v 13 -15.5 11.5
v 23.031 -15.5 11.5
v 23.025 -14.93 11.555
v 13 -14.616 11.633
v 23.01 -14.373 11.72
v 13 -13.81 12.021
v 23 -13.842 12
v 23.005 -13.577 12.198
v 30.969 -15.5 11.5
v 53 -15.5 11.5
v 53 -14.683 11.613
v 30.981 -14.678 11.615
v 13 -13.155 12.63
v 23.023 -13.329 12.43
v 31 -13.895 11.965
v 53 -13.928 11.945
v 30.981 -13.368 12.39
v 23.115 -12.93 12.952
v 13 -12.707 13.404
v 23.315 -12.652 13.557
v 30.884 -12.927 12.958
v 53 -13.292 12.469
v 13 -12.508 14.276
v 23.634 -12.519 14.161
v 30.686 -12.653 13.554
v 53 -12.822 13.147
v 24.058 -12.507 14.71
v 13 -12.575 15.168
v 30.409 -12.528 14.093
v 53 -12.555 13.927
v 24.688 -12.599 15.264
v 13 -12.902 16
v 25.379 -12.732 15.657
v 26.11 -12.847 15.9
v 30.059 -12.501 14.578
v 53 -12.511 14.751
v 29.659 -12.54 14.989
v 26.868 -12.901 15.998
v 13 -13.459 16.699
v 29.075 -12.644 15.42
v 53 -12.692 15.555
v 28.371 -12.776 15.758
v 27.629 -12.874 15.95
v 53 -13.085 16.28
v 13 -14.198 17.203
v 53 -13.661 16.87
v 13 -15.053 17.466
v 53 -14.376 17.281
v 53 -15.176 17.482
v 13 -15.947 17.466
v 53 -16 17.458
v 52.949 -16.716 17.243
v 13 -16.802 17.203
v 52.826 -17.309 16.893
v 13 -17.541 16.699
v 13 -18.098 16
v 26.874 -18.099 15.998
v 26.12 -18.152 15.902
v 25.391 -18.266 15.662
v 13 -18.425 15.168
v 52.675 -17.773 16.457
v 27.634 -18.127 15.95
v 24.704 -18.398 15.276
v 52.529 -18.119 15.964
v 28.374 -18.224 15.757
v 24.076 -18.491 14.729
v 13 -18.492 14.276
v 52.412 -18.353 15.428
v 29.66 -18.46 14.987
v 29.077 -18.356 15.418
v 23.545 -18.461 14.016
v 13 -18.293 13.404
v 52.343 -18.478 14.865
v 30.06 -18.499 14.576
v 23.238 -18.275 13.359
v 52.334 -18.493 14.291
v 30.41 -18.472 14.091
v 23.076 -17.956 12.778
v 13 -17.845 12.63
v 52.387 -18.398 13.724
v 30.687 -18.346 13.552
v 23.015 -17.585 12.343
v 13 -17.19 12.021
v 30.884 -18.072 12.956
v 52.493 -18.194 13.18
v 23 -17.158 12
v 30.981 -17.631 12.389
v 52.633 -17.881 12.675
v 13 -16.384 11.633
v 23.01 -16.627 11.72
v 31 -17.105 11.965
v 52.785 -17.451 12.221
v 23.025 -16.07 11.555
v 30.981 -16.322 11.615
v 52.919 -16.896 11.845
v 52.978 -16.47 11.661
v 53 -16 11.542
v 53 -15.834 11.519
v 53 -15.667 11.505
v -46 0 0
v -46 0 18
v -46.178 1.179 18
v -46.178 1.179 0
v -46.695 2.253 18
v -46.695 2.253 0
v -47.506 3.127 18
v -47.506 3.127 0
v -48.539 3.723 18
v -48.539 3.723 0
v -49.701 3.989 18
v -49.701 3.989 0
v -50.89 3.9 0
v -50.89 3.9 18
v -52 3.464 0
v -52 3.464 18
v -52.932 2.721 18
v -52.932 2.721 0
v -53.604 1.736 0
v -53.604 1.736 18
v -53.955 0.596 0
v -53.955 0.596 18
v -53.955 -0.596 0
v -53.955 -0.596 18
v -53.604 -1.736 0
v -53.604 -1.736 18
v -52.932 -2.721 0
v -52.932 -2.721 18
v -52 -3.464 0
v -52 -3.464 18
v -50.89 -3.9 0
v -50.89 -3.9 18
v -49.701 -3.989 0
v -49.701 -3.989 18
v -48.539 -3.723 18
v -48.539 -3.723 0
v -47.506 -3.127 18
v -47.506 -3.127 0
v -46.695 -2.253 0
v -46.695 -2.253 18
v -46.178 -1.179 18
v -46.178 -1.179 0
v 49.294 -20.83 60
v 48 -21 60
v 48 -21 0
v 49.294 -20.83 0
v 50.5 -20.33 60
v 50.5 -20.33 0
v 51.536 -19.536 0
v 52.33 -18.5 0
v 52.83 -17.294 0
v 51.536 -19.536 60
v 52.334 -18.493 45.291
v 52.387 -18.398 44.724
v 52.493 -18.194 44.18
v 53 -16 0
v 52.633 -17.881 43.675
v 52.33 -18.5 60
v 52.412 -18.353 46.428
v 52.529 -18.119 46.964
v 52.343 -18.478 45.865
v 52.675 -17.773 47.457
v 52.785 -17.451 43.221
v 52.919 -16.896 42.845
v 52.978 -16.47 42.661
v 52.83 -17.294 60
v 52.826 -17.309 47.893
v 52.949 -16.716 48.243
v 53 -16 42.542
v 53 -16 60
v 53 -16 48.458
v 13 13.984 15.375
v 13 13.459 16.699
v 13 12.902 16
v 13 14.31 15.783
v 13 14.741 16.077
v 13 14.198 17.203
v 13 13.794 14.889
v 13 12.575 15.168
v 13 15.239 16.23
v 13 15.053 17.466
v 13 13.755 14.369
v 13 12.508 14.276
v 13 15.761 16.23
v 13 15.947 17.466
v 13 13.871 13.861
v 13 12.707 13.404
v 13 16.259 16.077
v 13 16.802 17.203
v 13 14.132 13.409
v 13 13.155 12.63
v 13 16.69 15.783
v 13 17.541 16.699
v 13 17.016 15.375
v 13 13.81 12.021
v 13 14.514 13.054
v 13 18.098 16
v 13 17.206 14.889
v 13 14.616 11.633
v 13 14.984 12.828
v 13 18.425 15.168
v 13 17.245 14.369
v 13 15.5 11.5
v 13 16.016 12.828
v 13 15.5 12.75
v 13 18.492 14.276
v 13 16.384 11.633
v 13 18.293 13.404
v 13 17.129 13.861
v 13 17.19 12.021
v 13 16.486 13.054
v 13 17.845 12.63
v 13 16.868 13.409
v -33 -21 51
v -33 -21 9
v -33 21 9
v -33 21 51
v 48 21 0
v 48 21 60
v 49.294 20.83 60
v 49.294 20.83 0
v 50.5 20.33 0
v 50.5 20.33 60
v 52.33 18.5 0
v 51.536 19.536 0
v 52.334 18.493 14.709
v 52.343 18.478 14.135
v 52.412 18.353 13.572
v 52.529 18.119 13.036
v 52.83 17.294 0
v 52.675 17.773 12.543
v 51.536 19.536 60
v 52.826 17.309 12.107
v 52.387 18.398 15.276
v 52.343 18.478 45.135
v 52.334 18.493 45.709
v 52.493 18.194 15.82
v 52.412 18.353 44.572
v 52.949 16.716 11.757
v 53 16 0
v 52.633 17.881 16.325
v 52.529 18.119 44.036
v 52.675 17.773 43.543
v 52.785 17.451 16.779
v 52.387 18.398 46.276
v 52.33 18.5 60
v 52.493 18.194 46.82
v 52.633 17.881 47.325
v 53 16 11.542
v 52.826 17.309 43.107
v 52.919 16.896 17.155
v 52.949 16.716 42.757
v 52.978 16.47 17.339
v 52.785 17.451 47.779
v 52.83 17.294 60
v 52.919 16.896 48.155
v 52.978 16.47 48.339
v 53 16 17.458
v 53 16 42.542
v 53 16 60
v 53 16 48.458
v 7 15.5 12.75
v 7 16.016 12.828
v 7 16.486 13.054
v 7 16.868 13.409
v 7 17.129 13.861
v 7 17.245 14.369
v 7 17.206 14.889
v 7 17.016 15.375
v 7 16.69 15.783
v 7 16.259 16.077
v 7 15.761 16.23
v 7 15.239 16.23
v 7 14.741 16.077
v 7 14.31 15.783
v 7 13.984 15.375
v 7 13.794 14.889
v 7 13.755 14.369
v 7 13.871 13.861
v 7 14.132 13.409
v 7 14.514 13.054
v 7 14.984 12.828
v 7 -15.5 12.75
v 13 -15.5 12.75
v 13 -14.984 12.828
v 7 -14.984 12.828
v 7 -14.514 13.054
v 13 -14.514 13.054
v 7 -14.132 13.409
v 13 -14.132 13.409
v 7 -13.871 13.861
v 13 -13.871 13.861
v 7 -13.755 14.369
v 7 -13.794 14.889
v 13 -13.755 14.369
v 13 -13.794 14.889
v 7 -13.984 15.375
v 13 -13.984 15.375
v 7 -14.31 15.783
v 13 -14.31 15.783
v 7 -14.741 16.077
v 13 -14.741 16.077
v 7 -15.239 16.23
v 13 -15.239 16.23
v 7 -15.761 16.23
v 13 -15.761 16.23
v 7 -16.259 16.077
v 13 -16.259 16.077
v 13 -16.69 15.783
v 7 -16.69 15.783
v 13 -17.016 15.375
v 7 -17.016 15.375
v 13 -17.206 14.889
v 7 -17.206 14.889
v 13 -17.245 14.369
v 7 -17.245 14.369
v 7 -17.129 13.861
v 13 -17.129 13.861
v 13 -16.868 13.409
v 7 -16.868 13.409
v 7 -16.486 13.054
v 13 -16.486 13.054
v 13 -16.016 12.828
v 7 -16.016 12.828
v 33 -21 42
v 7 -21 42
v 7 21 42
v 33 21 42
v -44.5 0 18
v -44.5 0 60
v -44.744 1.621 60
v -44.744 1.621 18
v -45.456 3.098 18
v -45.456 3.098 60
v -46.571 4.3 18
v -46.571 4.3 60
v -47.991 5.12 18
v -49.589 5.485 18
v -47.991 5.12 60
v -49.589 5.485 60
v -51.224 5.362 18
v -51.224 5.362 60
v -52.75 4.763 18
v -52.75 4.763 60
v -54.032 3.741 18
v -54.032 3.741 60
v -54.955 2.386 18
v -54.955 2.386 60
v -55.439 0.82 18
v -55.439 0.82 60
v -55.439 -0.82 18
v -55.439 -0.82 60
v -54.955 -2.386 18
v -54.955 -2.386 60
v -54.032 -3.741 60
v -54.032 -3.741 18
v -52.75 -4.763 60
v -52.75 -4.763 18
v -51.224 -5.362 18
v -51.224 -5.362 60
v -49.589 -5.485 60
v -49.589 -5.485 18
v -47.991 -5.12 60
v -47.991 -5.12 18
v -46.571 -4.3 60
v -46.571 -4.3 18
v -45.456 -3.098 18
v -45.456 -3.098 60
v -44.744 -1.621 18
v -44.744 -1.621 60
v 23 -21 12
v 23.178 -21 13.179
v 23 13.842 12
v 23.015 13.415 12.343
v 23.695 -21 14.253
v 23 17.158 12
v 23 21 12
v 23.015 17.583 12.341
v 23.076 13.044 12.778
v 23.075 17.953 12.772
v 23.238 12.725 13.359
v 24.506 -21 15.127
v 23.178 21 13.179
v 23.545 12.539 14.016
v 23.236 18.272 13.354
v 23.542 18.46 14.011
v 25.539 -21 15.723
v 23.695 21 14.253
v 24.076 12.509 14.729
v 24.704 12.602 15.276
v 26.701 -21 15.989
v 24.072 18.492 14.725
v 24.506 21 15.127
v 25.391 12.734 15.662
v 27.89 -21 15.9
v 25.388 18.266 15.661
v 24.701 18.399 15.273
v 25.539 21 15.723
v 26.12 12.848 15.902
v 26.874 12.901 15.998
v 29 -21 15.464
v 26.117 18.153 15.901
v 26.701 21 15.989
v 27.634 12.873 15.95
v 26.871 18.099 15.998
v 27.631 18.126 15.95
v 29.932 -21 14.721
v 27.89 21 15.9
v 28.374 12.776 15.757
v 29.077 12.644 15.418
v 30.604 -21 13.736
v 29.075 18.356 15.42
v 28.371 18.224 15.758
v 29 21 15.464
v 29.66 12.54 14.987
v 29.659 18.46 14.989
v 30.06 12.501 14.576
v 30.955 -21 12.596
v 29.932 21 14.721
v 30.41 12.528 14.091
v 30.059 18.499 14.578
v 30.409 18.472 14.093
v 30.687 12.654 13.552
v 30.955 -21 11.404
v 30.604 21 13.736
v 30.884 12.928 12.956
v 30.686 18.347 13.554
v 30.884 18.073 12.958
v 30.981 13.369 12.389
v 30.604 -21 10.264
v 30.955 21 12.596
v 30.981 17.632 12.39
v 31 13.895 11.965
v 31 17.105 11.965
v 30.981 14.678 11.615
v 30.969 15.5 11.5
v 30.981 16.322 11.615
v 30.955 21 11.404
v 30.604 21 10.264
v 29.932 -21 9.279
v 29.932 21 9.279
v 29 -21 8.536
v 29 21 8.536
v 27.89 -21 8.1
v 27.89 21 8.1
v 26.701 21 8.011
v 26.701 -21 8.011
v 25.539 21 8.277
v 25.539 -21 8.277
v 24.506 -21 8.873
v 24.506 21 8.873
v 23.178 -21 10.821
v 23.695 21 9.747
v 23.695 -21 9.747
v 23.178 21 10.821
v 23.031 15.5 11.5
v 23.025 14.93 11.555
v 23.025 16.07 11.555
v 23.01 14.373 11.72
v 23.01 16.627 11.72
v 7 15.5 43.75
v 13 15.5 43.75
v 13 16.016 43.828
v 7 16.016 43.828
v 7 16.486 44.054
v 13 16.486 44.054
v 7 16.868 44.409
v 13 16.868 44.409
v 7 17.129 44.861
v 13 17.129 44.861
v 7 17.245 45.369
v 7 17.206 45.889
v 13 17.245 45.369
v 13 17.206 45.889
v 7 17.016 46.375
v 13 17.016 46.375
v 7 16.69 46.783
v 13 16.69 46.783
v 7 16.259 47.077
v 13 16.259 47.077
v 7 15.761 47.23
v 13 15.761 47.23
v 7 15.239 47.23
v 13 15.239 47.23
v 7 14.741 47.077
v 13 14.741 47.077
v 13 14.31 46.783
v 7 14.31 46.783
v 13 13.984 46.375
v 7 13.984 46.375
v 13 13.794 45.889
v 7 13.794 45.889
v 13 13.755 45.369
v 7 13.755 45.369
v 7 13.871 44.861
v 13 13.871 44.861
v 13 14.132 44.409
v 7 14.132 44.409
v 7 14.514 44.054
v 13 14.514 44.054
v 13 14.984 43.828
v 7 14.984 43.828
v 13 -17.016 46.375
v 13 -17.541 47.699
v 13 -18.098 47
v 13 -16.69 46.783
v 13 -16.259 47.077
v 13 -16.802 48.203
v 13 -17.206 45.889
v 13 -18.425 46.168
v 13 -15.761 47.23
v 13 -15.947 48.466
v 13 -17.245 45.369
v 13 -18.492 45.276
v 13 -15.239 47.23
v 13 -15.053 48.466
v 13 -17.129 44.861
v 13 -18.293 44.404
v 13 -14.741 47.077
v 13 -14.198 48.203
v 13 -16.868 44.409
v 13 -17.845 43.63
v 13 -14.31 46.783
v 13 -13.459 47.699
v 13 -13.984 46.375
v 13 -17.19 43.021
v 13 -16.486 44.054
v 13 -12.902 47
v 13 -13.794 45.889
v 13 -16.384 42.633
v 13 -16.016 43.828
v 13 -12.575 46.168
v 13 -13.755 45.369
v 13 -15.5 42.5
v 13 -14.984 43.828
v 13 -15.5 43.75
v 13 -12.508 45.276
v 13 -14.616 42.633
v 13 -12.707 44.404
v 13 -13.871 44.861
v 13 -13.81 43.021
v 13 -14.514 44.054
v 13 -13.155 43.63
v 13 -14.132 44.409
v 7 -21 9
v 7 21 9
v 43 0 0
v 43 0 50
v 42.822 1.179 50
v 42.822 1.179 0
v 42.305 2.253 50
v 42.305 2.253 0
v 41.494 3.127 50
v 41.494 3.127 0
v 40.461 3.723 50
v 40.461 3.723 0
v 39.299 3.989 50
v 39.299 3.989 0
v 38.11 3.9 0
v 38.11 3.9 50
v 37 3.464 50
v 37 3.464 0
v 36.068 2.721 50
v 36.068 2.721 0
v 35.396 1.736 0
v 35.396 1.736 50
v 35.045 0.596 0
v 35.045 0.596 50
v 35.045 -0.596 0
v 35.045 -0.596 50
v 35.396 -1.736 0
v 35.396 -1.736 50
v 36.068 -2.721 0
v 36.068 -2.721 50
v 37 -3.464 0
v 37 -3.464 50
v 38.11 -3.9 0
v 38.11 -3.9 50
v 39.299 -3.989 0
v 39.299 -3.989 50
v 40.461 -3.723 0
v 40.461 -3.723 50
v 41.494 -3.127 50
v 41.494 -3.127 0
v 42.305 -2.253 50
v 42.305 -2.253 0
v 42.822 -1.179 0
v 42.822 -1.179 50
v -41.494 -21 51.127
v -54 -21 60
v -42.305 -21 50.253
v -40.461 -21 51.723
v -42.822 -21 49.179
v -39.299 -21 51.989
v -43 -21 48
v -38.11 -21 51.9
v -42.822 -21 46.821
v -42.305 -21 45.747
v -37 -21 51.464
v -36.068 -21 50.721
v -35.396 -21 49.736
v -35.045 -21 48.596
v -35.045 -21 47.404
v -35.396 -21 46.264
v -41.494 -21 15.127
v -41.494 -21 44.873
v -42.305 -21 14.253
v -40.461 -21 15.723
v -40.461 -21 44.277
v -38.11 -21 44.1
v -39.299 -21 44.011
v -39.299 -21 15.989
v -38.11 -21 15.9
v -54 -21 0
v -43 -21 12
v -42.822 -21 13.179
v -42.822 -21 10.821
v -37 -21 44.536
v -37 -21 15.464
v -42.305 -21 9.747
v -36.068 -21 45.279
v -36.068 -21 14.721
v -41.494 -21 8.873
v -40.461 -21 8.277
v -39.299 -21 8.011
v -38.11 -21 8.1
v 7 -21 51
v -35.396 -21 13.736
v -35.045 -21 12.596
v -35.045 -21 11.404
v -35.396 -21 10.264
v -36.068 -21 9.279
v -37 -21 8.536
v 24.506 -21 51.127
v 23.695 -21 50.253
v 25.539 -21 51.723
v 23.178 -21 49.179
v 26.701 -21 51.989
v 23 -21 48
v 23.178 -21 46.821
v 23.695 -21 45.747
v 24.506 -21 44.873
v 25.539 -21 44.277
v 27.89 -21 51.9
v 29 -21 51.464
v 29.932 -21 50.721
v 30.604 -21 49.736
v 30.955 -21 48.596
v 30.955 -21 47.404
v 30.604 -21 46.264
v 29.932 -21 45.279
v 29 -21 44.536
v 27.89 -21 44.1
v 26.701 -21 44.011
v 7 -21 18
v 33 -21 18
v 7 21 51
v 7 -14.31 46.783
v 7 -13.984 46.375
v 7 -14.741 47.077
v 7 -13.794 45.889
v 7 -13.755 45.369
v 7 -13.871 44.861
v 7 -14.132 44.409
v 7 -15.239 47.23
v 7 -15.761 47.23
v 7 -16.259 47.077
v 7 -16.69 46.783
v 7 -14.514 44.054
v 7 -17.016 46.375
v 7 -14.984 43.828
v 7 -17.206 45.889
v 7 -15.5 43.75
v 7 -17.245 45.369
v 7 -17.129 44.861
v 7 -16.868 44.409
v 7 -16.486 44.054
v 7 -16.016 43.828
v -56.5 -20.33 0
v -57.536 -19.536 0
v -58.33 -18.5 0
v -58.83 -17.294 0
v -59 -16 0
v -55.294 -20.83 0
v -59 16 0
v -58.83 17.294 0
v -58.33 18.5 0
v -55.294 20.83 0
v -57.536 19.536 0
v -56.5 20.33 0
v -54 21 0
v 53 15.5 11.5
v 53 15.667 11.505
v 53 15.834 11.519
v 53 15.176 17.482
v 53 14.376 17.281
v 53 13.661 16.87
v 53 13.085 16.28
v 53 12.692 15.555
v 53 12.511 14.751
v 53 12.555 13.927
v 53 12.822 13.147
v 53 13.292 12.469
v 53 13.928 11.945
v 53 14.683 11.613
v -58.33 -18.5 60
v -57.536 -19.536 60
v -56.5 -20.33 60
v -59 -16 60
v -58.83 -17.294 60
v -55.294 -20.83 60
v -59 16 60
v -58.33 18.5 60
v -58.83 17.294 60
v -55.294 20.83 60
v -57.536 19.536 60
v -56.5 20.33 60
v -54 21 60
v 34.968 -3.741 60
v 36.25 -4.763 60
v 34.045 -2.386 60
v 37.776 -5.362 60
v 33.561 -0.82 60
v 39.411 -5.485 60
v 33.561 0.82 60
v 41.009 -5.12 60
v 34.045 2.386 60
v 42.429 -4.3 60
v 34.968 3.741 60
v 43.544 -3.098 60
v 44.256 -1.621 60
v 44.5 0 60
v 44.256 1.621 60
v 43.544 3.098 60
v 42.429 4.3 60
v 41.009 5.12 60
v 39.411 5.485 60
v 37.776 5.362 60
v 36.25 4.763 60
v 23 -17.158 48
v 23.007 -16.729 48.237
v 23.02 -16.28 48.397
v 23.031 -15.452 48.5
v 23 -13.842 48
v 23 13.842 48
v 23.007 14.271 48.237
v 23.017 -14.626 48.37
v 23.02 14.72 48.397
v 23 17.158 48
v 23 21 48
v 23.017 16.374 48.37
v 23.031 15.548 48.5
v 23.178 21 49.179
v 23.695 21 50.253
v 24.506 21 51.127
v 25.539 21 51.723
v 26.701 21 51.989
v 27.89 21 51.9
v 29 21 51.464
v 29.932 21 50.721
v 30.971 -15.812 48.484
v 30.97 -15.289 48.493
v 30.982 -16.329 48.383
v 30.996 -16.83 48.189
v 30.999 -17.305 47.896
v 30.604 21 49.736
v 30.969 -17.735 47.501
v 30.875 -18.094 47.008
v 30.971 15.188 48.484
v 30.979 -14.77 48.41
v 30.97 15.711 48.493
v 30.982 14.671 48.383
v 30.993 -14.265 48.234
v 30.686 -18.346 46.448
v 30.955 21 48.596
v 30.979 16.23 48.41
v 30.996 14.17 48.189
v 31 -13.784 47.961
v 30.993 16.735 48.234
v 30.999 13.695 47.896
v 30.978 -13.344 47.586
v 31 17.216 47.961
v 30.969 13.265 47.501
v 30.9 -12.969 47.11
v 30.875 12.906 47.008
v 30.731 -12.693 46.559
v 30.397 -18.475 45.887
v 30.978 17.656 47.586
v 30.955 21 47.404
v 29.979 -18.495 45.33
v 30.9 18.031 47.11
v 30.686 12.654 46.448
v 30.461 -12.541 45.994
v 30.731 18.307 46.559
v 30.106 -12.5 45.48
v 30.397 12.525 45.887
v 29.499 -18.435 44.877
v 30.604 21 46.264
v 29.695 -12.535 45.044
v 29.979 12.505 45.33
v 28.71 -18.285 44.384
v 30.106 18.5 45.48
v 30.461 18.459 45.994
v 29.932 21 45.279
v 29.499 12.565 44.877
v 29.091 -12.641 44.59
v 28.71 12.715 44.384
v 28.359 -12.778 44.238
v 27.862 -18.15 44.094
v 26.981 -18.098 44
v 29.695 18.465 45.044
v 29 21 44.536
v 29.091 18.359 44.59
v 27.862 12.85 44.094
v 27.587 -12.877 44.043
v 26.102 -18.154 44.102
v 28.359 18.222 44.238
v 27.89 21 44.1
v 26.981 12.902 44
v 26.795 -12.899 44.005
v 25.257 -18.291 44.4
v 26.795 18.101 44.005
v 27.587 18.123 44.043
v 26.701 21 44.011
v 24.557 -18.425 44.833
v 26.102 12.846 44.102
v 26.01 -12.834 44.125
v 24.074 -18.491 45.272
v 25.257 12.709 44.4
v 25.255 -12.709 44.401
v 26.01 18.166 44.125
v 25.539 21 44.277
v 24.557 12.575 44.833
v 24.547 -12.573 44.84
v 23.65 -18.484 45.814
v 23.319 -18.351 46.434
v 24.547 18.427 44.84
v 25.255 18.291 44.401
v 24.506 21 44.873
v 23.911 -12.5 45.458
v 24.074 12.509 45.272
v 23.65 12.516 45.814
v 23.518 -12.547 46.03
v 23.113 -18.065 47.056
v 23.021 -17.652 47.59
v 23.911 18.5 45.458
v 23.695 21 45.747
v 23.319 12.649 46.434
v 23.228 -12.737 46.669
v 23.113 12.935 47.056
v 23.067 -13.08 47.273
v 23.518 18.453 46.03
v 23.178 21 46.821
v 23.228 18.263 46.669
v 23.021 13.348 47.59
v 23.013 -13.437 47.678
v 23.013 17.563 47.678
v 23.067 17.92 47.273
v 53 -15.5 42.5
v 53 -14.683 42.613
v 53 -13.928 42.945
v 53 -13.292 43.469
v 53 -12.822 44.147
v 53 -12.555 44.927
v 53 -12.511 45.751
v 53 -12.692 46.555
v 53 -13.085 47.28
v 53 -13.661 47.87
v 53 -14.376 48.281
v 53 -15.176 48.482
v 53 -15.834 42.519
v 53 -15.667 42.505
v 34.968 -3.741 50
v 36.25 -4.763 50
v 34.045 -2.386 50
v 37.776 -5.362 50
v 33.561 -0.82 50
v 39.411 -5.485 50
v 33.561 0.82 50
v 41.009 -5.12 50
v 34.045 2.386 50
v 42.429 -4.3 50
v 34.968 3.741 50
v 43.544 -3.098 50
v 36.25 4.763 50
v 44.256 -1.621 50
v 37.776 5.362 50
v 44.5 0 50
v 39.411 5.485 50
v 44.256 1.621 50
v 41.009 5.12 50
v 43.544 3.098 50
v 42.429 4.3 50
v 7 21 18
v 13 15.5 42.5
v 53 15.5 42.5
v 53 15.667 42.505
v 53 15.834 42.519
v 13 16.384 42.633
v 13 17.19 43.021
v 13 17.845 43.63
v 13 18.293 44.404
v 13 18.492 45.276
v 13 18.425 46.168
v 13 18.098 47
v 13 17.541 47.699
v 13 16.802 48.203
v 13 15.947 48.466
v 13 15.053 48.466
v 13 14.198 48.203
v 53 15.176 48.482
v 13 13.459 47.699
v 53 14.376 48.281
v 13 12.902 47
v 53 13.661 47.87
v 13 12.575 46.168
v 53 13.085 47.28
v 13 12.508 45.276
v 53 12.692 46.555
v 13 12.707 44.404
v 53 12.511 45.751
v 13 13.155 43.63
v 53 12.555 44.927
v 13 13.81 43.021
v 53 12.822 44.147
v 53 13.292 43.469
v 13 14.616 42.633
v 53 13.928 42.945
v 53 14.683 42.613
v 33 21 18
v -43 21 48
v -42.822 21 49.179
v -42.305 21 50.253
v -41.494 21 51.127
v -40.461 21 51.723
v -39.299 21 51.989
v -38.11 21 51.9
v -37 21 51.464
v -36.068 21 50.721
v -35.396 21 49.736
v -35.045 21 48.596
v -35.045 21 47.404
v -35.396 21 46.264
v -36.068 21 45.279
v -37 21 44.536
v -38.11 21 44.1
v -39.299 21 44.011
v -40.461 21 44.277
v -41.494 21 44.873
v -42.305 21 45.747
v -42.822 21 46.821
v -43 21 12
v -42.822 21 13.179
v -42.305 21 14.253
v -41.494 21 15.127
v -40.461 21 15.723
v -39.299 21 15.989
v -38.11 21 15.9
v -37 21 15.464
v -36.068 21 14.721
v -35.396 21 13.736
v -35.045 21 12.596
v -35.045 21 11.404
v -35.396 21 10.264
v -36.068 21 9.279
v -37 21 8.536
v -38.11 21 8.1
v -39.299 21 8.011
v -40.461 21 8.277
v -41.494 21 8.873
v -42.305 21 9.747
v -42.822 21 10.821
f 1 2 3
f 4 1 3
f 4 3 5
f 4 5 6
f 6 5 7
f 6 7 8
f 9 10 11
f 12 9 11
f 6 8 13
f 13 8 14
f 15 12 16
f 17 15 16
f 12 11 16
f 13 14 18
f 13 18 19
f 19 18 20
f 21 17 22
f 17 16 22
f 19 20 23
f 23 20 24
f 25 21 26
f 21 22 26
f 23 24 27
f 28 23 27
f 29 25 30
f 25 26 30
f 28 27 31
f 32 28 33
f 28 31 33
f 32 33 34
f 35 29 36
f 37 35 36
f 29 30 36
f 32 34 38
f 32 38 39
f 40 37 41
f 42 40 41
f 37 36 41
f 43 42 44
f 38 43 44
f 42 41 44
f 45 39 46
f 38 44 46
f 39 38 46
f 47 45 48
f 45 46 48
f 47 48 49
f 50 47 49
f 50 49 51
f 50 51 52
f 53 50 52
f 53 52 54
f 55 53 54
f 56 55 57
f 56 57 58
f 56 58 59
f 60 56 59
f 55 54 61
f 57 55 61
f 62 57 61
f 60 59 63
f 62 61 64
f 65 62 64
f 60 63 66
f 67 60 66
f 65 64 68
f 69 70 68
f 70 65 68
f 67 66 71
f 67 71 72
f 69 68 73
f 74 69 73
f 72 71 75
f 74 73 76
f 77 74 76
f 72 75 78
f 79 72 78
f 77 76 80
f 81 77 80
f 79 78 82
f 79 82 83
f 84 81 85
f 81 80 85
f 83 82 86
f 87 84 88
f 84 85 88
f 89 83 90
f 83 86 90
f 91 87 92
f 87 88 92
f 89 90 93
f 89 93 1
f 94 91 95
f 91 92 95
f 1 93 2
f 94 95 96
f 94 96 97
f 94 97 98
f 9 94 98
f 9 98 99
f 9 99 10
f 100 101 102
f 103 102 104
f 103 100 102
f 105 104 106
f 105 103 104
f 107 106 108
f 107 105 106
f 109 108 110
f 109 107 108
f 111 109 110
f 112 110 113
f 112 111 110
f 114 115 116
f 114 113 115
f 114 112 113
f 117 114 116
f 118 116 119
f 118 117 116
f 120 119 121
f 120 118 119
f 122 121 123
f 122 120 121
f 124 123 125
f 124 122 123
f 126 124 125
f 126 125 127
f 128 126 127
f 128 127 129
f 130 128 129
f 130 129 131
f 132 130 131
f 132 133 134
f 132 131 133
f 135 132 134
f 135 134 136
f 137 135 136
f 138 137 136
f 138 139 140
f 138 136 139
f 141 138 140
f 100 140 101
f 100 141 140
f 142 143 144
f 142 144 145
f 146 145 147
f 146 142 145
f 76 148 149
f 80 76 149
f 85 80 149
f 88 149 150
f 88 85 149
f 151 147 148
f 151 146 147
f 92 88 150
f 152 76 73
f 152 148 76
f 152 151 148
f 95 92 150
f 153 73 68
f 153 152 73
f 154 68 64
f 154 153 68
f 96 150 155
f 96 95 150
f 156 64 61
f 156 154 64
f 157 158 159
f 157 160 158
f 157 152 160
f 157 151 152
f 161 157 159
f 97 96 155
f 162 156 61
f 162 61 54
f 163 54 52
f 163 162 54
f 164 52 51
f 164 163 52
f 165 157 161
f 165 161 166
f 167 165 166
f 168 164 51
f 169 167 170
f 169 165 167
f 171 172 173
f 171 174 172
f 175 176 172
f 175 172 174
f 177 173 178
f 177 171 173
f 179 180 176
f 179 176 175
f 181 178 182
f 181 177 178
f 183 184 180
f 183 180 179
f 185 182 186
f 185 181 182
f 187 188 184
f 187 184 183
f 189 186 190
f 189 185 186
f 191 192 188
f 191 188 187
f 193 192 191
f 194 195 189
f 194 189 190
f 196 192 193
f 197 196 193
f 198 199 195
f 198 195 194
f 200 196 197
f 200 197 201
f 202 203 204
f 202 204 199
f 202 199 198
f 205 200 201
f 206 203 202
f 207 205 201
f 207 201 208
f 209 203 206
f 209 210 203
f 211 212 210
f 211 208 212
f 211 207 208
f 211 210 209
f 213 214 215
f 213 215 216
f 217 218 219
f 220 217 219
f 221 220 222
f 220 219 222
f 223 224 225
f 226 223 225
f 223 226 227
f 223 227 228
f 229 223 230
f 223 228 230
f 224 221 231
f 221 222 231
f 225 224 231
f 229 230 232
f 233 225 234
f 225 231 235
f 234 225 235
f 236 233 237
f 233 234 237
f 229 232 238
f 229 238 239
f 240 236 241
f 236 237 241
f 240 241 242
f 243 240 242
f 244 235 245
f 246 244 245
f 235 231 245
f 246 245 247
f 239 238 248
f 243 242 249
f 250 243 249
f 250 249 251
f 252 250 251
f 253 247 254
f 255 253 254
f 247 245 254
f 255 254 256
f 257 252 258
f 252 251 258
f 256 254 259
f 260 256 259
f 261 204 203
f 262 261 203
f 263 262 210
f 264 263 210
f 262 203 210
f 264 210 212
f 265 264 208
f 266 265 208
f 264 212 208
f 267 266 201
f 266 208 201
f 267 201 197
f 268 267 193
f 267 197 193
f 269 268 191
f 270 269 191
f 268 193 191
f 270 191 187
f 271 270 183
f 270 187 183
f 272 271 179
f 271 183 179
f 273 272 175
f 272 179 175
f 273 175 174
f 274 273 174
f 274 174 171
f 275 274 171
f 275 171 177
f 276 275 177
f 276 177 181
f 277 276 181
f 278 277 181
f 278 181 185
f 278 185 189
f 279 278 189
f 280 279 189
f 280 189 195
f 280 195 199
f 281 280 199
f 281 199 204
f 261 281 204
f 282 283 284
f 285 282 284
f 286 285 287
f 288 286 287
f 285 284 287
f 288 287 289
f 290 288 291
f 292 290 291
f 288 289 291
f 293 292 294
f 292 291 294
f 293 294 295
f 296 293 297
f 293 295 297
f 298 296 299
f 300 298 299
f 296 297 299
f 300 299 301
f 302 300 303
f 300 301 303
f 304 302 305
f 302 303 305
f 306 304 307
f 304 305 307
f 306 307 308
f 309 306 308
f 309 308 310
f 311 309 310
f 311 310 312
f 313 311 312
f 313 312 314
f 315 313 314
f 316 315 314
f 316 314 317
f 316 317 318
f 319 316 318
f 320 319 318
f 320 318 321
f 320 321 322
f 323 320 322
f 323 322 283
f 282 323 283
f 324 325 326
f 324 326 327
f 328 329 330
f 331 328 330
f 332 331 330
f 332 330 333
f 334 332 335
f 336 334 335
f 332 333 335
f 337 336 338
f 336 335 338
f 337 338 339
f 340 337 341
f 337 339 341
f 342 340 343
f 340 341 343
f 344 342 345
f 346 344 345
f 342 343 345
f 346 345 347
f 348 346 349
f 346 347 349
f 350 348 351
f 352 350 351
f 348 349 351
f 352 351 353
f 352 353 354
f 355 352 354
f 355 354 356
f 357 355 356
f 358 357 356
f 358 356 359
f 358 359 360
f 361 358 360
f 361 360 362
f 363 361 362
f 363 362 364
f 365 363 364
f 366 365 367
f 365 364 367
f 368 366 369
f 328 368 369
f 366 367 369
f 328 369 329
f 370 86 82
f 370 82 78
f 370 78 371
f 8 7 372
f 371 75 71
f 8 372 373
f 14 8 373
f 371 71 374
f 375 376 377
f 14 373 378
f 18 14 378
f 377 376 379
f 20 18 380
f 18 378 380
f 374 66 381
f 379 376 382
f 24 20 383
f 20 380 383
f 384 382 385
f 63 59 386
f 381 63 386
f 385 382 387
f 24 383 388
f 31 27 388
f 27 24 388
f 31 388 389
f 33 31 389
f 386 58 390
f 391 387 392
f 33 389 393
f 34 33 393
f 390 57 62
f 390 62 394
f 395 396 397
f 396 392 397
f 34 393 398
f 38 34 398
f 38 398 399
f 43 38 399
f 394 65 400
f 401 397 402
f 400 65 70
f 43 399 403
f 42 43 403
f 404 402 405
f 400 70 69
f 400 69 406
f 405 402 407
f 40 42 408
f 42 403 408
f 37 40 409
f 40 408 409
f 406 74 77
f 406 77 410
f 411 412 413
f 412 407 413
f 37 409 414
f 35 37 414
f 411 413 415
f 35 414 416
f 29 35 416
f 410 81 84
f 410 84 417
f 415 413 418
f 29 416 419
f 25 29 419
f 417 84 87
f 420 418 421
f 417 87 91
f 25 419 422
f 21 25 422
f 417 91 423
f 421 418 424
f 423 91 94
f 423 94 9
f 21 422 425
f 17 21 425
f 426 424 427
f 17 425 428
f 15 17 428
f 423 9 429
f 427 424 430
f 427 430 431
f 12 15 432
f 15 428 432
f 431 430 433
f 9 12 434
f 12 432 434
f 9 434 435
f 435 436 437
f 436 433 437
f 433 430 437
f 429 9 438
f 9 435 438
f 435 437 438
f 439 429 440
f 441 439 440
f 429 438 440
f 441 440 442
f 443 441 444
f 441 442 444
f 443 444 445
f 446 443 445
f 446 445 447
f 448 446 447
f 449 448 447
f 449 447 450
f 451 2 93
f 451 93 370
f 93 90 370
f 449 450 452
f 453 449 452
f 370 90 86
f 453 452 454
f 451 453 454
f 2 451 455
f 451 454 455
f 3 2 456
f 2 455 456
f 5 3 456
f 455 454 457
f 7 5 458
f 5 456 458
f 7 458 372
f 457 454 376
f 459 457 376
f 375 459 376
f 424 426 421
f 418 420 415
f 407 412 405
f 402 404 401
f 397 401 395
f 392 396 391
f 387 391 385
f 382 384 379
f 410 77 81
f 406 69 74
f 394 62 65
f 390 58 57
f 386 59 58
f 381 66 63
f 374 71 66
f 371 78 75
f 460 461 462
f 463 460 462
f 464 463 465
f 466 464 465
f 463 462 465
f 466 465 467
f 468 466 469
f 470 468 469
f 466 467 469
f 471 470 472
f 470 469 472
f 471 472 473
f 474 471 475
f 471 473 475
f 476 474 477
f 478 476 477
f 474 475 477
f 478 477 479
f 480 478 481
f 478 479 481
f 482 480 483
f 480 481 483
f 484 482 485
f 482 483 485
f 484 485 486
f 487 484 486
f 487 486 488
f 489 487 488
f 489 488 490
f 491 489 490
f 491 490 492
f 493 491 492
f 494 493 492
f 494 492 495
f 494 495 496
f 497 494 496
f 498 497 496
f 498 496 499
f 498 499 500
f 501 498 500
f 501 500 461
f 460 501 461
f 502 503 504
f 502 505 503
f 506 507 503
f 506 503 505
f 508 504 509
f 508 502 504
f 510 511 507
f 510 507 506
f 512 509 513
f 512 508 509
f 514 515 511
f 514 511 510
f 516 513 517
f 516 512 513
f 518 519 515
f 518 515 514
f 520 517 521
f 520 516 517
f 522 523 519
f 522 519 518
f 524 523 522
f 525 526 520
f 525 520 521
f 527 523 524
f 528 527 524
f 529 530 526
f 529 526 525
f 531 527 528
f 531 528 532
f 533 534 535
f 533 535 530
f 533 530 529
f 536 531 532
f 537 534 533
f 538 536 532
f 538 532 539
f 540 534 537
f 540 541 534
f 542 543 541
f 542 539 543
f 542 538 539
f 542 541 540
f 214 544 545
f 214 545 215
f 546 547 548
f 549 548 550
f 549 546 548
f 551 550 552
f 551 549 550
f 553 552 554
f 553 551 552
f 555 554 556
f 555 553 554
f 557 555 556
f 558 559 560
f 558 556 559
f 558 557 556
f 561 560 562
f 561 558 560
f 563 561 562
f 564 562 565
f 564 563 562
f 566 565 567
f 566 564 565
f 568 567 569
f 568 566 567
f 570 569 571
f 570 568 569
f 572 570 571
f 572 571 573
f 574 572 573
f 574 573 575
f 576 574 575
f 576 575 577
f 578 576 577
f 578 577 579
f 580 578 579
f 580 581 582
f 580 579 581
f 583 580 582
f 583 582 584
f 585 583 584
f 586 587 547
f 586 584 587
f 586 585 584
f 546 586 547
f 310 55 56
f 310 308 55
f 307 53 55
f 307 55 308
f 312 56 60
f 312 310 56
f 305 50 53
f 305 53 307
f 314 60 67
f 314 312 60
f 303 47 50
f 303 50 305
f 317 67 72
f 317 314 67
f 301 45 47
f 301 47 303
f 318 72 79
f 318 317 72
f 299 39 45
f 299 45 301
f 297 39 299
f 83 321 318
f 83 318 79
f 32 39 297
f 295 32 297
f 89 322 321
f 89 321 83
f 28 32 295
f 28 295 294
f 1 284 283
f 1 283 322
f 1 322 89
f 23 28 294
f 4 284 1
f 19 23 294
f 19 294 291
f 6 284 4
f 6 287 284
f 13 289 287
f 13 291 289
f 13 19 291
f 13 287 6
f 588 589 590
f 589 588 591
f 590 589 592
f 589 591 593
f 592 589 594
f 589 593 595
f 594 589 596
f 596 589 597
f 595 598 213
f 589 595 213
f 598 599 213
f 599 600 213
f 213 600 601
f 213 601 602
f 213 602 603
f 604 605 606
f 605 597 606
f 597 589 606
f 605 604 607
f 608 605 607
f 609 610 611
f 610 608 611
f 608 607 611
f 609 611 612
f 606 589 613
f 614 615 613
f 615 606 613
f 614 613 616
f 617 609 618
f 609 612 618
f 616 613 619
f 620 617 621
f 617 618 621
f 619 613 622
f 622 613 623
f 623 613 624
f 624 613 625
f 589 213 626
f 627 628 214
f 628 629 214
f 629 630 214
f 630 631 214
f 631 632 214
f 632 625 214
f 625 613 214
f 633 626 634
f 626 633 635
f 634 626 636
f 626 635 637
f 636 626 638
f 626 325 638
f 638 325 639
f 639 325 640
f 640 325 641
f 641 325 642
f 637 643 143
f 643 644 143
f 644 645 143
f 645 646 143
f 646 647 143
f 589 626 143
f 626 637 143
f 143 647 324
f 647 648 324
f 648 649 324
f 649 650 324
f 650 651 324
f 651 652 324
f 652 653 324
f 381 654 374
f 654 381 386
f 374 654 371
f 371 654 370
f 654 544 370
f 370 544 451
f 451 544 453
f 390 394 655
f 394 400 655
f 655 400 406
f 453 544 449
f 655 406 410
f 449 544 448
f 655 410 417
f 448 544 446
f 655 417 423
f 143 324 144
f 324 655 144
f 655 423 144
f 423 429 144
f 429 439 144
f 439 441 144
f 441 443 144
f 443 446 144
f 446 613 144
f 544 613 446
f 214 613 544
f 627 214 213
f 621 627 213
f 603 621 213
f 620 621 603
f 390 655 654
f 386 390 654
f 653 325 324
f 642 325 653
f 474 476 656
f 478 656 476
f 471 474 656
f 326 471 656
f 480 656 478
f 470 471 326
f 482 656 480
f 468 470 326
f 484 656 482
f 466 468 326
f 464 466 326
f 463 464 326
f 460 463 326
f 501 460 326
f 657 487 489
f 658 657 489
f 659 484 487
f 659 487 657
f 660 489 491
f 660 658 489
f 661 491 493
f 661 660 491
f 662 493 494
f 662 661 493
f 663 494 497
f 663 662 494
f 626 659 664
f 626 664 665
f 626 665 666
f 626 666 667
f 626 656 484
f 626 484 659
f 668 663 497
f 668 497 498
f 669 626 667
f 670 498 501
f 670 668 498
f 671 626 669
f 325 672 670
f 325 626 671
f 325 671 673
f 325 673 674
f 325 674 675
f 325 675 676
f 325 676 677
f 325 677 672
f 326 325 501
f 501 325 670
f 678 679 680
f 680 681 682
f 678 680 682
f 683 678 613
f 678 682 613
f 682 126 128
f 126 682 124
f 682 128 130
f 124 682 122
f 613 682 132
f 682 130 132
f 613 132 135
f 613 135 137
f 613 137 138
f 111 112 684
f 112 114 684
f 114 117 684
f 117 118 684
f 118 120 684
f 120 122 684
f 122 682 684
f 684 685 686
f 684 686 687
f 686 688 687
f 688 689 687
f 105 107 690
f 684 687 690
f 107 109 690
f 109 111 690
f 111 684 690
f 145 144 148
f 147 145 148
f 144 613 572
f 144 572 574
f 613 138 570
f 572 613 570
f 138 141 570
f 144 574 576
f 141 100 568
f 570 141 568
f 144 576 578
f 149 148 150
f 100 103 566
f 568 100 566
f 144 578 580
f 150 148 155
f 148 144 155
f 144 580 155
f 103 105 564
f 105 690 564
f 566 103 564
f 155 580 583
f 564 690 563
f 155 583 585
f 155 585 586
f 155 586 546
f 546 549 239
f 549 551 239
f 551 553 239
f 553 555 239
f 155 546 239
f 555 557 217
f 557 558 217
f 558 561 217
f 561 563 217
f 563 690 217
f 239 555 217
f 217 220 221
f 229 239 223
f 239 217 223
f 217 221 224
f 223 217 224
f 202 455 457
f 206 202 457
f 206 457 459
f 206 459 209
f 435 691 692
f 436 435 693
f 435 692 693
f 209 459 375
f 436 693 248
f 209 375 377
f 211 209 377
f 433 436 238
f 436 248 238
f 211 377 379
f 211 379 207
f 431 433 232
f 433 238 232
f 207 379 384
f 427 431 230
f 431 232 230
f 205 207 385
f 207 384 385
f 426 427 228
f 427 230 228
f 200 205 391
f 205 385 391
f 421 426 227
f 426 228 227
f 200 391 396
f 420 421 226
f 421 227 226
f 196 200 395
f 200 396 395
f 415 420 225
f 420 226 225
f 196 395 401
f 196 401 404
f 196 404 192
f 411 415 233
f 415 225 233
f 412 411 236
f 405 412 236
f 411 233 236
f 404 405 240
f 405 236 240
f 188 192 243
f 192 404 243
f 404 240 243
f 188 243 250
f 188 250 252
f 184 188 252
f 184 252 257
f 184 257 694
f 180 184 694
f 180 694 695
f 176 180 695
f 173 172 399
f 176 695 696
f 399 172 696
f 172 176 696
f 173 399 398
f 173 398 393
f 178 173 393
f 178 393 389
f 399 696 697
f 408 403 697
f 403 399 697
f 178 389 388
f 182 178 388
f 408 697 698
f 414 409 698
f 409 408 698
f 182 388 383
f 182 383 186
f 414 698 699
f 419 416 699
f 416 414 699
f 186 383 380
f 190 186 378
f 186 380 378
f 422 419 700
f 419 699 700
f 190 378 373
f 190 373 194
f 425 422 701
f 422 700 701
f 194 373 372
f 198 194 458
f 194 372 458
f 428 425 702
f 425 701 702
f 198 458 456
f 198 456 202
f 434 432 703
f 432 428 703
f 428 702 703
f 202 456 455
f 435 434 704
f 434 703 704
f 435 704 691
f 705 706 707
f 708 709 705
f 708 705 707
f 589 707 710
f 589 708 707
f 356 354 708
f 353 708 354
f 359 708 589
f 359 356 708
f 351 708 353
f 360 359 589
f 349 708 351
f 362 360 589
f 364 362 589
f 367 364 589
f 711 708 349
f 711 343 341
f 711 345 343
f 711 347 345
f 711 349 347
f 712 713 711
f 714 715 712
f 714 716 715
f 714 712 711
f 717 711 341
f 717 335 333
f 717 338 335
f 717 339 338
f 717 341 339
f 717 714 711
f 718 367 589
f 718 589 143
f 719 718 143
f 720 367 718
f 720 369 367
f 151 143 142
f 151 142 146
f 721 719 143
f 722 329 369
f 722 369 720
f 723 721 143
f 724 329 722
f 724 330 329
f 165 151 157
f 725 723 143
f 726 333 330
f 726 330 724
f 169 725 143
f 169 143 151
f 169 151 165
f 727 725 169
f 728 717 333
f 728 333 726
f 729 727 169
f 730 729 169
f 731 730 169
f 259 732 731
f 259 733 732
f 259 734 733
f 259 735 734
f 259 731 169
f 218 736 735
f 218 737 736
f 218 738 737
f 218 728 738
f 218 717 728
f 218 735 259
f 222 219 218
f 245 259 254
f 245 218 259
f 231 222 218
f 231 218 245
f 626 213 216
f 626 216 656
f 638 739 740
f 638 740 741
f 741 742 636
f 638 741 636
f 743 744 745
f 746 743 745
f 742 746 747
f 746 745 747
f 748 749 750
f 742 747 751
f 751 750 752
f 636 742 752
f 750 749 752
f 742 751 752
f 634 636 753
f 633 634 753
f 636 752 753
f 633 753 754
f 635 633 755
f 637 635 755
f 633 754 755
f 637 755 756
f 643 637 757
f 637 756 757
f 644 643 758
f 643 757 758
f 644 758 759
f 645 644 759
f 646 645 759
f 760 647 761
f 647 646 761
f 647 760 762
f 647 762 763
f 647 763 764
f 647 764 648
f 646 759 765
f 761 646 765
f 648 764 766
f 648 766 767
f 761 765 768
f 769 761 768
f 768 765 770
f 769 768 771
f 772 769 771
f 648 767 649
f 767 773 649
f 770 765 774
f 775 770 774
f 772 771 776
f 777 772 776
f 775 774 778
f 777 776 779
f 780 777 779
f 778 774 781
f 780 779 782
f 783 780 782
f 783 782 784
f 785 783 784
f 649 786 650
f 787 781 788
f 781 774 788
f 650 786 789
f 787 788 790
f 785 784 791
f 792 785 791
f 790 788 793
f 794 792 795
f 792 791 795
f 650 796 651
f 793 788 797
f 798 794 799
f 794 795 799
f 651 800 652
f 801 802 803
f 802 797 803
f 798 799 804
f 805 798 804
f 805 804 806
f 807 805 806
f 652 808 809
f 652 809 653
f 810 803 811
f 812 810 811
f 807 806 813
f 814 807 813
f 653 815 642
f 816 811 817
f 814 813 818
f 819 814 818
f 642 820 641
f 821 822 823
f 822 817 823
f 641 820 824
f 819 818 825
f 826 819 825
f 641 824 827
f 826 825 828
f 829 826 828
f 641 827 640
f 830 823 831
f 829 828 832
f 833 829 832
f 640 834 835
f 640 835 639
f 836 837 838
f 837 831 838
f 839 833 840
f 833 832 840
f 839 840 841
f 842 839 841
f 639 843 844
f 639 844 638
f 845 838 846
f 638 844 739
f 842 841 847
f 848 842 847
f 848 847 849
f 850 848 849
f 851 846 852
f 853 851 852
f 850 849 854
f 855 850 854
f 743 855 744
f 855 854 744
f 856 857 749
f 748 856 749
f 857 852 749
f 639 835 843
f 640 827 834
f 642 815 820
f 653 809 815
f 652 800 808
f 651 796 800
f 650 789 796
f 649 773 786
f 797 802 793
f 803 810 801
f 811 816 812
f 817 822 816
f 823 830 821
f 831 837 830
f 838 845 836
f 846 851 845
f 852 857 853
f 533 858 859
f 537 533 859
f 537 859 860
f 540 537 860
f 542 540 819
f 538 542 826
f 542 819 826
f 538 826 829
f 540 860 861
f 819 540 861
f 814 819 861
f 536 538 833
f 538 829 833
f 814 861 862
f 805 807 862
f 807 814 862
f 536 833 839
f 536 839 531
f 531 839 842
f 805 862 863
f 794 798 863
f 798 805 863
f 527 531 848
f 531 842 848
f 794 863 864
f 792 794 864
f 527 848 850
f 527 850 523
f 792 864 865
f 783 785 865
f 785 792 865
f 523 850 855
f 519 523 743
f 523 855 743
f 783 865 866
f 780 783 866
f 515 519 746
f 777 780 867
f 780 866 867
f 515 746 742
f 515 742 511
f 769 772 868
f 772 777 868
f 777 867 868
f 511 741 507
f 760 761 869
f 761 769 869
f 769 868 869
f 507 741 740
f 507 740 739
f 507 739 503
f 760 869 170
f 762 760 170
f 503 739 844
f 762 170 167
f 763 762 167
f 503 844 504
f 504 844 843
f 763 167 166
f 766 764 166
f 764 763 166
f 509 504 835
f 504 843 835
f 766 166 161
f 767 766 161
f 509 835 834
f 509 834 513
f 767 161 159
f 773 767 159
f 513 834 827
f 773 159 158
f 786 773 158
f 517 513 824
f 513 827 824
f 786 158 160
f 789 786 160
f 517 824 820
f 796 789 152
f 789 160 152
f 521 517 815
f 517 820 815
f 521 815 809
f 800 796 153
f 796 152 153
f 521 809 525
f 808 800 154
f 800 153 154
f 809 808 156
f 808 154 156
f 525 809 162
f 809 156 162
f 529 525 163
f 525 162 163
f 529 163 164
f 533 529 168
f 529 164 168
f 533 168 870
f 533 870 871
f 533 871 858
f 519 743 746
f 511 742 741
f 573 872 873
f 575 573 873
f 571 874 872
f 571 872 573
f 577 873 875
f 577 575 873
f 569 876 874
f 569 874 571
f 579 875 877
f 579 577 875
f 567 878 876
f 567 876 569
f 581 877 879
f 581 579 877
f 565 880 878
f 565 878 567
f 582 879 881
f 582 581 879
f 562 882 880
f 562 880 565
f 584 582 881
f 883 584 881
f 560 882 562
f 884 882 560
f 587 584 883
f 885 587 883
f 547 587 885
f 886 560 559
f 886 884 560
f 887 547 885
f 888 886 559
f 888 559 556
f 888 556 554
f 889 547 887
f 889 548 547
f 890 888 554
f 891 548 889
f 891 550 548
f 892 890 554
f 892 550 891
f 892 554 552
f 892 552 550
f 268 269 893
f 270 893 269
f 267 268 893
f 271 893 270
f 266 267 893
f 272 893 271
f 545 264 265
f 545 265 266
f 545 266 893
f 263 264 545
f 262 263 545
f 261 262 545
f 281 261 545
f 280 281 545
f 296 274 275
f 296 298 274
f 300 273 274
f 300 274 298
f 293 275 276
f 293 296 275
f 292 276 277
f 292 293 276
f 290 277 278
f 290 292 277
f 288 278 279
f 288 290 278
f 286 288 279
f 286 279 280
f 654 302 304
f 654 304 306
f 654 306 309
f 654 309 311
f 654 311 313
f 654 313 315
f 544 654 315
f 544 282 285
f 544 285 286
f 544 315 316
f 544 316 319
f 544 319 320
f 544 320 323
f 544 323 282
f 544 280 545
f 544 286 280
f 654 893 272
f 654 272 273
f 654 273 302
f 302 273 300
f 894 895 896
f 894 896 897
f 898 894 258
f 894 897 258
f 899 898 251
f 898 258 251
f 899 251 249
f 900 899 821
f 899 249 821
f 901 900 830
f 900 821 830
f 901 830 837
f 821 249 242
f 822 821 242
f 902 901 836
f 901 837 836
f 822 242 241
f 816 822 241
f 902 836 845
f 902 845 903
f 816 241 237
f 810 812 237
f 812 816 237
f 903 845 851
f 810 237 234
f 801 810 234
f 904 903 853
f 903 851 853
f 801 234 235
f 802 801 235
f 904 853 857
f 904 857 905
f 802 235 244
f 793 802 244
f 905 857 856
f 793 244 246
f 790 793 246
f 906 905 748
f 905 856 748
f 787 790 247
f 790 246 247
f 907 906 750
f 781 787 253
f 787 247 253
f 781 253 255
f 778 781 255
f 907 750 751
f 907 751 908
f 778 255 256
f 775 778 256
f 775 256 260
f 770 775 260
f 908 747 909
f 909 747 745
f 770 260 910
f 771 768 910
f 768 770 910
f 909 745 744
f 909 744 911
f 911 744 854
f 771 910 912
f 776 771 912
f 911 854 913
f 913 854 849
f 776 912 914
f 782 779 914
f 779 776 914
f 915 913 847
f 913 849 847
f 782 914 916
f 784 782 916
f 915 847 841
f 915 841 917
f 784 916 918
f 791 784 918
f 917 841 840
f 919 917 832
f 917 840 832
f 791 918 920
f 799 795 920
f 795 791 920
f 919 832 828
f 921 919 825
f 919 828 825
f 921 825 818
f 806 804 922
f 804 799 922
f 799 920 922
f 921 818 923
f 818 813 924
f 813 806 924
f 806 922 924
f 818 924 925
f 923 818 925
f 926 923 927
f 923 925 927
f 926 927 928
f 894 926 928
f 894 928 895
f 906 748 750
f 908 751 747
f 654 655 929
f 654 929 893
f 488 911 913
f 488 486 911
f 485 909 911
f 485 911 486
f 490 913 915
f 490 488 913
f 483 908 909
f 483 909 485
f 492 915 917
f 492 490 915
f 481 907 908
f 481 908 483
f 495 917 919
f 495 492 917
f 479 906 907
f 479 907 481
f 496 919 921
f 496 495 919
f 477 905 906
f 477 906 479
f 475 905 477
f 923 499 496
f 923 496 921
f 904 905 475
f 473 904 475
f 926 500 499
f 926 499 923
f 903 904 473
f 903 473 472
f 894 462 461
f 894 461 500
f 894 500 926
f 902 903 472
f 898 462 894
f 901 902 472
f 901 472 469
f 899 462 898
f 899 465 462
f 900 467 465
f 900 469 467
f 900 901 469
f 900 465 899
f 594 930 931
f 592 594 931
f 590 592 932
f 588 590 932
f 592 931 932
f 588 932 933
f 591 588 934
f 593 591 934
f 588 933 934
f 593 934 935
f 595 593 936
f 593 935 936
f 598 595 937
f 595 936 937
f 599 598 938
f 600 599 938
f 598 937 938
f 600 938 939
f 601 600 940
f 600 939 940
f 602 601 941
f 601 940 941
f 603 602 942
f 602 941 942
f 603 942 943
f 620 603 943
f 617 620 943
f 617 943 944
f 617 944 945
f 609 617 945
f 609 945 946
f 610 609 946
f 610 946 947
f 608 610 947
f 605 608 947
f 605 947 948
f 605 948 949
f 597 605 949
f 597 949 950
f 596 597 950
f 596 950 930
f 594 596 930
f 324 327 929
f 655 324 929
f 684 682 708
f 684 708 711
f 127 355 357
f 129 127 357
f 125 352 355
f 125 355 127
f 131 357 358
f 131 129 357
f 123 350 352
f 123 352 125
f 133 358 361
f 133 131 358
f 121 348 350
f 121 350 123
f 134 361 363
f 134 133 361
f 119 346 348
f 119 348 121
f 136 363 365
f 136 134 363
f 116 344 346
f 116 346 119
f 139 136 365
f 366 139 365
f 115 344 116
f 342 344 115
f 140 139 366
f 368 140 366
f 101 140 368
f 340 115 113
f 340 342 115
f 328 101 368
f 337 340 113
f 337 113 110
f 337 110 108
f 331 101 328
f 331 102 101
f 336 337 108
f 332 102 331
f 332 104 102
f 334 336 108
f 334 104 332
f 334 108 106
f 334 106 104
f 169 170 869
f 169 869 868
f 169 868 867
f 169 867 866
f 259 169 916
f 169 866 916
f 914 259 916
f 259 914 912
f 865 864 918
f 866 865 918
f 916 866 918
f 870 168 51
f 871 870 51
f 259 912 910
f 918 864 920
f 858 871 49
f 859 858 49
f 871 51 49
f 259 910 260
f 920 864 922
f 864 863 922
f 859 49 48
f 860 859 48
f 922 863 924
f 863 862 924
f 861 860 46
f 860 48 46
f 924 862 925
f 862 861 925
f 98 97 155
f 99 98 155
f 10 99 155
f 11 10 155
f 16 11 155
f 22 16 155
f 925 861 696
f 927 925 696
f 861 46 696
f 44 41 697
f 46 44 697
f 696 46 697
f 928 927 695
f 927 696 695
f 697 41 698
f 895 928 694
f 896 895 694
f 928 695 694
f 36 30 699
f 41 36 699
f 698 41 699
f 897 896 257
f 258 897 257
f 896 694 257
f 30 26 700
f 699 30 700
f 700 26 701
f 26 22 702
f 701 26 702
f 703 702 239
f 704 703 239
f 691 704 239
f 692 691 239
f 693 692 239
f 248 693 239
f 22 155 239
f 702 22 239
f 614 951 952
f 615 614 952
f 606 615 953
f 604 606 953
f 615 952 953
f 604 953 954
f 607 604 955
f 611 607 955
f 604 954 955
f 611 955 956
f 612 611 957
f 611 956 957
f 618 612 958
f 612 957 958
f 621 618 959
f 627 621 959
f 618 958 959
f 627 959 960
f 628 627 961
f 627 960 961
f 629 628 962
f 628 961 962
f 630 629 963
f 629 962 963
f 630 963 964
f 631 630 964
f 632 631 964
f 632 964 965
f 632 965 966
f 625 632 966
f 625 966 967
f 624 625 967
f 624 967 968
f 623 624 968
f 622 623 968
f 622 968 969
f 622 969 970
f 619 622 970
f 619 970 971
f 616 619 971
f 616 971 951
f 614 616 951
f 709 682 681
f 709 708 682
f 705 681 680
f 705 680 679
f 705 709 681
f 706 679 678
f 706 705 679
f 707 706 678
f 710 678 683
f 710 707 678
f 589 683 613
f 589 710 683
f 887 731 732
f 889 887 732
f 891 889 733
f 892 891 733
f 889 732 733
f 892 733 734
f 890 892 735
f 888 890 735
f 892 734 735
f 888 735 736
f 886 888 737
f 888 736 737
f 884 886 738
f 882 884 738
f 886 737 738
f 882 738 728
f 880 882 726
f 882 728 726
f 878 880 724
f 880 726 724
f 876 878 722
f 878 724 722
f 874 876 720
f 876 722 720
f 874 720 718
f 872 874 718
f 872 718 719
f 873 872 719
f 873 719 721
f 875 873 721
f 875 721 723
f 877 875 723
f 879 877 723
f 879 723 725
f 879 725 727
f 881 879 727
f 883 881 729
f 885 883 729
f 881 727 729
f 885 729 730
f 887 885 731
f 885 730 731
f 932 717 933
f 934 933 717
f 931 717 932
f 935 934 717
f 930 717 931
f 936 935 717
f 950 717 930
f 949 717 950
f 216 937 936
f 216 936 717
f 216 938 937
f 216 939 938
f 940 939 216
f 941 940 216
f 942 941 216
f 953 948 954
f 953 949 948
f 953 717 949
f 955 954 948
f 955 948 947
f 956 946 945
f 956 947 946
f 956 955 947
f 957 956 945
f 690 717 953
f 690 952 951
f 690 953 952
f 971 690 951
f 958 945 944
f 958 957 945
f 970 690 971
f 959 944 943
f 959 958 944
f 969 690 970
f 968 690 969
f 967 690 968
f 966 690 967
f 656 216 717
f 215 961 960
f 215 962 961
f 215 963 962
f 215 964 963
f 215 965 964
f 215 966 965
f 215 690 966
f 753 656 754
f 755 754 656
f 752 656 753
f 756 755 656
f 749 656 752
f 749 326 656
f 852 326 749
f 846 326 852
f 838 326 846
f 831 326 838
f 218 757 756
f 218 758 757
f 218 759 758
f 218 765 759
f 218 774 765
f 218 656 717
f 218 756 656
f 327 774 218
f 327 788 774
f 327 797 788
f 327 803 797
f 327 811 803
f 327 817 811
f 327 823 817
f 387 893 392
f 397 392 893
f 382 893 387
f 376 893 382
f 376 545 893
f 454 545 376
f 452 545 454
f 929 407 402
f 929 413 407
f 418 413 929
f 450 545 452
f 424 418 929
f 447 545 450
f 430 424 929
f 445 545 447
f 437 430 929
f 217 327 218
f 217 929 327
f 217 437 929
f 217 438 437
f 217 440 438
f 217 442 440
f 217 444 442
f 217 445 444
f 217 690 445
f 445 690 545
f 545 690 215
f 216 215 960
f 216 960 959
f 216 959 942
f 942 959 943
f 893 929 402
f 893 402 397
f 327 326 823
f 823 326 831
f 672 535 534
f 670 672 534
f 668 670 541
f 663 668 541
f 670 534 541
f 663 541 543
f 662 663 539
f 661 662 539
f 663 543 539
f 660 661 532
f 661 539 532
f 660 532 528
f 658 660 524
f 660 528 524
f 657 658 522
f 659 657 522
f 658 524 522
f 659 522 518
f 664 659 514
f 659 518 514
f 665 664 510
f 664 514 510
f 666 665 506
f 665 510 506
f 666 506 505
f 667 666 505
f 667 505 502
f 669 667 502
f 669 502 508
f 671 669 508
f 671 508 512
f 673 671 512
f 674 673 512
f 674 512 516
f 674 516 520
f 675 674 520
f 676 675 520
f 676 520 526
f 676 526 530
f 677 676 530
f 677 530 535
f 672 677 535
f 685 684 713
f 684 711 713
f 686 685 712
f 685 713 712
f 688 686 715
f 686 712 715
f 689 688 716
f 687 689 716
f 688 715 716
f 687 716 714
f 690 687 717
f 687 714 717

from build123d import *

# Parameters (mm, degrees)
SKETCH_1_W          = 112
SKETCH_1_H          = 42
SKETCH_1_R          = 4
EXTRUDE_1_DEPTH     = 60
SKETCH_3_R          = 4
CUT_EXTRUDE_2_DEPTH = 95.047860156
FILLET_1_R          = 5
SKETCH_6_R          = 5.5
CUT_EXTRUDE_4_DEPTH = 10
SKETCH_7_R          = 5.5
CUT_EXTRUDE_5_DEPTH = 42
CUT_EXTRUDE_7_DEPTH = 95.047860156
CUT_EXTRUDE_8_REACH = 130.783
SKETCH_10_R         = 1.75
SKETCH_11_R         = 3
CUT_EXTRUDE_9_DEPTH = 40


with BuildPart() as part:
    # 草圖1 → 填料-伸長1 (new body)
    with BuildSketch(Plane.XY):
        with Locations((-3, 0)):
            Rectangle(SKETCH_1_W, SKETCH_1_H)
        with Locations((39, 0)):
            Circle(SKETCH_1_R, mode=Mode.SUBTRACT)
        with Locations((-50, 0)):
            Circle(SKETCH_1_R, mode=Mode.SUBTRACT)
    extrude(amount=EXTRUDE_1_DEPTH)

    # 草圖3 → 除料-伸長2 (cut, through all)
    with BuildSketch(Plane(origin=(0, 21, 0), x_dir=(1, 0, 0), z_dir=(0, 1, 0))):
        with Locations(Location((-39, -12, 0), (0, 0, 180))):
            Circle(SKETCH_3_R)
        with Locations(Location((27, -12, 0), (0, 0, 180))):
            Circle(SKETCH_3_R)
        with Locations(Location((27, -48, 0), (0, 0, 180))):
            Circle(SKETCH_3_R)
        with Locations(Location((-39, -48, 0), (0, 0, 180))):
            Circle(SKETCH_3_R)
    extrude(amount=-CUT_EXTRUDE_2_DEPTH, mode=Mode.SUBTRACT)

    # 圓角1
    fillet_1_edges = [part.edges().sort_by_distance(p)[0] for p in [
        (-59, 21, 30),
        (53, 21, 30),
        (53, -21, 30),
        (-59, -21, 30),
    ]]
    fillet(fillet_1_edges, radius=FILLET_1_R)

    # 草圖6 → 除料-伸長4 (cut)
    with BuildSketch(Plane.XY.offset(60)):
        with Locations((39, 0)):
            Circle(SKETCH_6_R)
    extrude(amount=-CUT_EXTRUDE_4_DEPTH, mode=Mode.SUBTRACT)

    # 草圖7 → 除料-伸長5 (cut)
    with BuildSketch(Plane.XY.offset(60)):
        with Locations((-50, 0)):
            Circle(SKETCH_7_R)
    extrude(amount=-CUT_EXTRUDE_5_DEPTH, mode=Mode.SUBTRACT)

    # 草圖9 → 除料-伸長7 (cut, through all)
    with BuildSketch(Plane.XZ.offset(21)):
        Polygon((-33, 51), (7, 51), (7, 42), (33, 42), (33, 18), (7, 18), (7, 9), (-33, 9), align=None)
    extrude(amount=-CUT_EXTRUDE_7_DEPTH, mode=Mode.SUBTRACT)

    # 除料-伸長8: up to this face of the body (flat: up to its plane)
    cut_extrude_8_end = Plane(part.part.faces().sort_by_distance((7, 0, 46.5))[0])
    # 草圖10 → 除料-伸長8 (cut, up to the picked face)
    with BuildSketch(Plane(origin=(53, 0, 0), x_dir=(0, 0, -1), z_dir=(1, 0, 0)), mode=Mode.PRIVATE) as cut_extrude_8_sk1:
        with Locations((-45.5, -15.5)):
            Circle(SKETCH_10_R)
    cut_extrude_8_tool1 = split(extrude(cut_extrude_8_sk1.sketch, amount=-CUT_EXTRUDE_8_REACH, mode=Mode.PRIVATE), bisect_by=cut_extrude_8_end, keep=Keep.BOTH, mode=Mode.PRIVATE)
    # 草圖10 → 除料-伸長8 (cut, up to the picked face)
    with BuildSketch(Plane(origin=(53, 0, 0), x_dir=(0, 0, -1), z_dir=(1, 0, 0)), mode=Mode.PRIVATE) as cut_extrude_8_sk2:
        with Locations((-45.5, 15.5)):
            Circle(SKETCH_10_R)
    cut_extrude_8_tool2 = split(extrude(cut_extrude_8_sk2.sketch, amount=-CUT_EXTRUDE_8_REACH, mode=Mode.PRIVATE), bisect_by=cut_extrude_8_end, keep=Keep.BOTH, mode=Mode.PRIVATE)
    # 草圖10 → 除料-伸長8 (cut, up to the picked face)
    with BuildSketch(Plane(origin=(53, 0, 0), x_dir=(0, 0, -1), z_dir=(1, 0, 0)), mode=Mode.PRIVATE) as cut_extrude_8_sk3:
        with Locations((-14.5, 15.5)):
            Circle(SKETCH_10_R)
    cut_extrude_8_tool3 = split(extrude(cut_extrude_8_sk3.sketch, amount=-CUT_EXTRUDE_8_REACH, mode=Mode.PRIVATE), bisect_by=cut_extrude_8_end, keep=Keep.BOTH, mode=Mode.PRIVATE)
    # 草圖10 → 除料-伸長8 (cut, up to the picked face)
    with BuildSketch(Plane(origin=(53, 0, 0), x_dir=(0, 0, -1), z_dir=(1, 0, 0)), mode=Mode.PRIVATE) as cut_extrude_8_sk4:
        with Locations((-14.5, -15.5)):
            Circle(SKETCH_10_R)
    cut_extrude_8_tool4 = split(extrude(cut_extrude_8_sk4.sketch, amount=-CUT_EXTRUDE_8_REACH, mode=Mode.PRIVATE), bisect_by=cut_extrude_8_end, keep=Keep.BOTH, mode=Mode.PRIVATE)
    add(cut_extrude_8_tool1.solids().sort_by(Axis((53, -15.5, 45.5), (-1, 0, 0)))[0], mode=Mode.SUBTRACT)
    add(cut_extrude_8_tool2.solids().sort_by(Axis((53, 15.5, 45.5), (-1, 0, 0)))[0], mode=Mode.SUBTRACT)
    add(cut_extrude_8_tool3.solids().sort_by(Axis((53, 15.5, 14.5), (-1, 0, 0)))[0], mode=Mode.SUBTRACT)
    add(cut_extrude_8_tool4.solids().sort_by(Axis((53, -15.5, 14.5), (-1, 0, 0)))[0], mode=Mode.SUBTRACT)

    # 草圖11 → 除料-伸長9 (cut)
    with BuildSketch(Plane(origin=(53, 0, 0), x_dir=(0, 0, -1), z_dir=(1, 0, 0))):
        with Locations((-45.5, -15.5)):
            Circle(SKETCH_11_R)
        with Locations((-45.5, 15.5)):
            Circle(SKETCH_11_R)
        with Locations((-14.5, 15.5)):
            Circle(SKETCH_11_R)
        with Locations((-14.5, -15.5)):
            Circle(SKETCH_11_R)
    extrude(amount=-CUT_EXTRUDE_9_DEPTH, mode=Mode.SUBTRACT)


solid = part.part
